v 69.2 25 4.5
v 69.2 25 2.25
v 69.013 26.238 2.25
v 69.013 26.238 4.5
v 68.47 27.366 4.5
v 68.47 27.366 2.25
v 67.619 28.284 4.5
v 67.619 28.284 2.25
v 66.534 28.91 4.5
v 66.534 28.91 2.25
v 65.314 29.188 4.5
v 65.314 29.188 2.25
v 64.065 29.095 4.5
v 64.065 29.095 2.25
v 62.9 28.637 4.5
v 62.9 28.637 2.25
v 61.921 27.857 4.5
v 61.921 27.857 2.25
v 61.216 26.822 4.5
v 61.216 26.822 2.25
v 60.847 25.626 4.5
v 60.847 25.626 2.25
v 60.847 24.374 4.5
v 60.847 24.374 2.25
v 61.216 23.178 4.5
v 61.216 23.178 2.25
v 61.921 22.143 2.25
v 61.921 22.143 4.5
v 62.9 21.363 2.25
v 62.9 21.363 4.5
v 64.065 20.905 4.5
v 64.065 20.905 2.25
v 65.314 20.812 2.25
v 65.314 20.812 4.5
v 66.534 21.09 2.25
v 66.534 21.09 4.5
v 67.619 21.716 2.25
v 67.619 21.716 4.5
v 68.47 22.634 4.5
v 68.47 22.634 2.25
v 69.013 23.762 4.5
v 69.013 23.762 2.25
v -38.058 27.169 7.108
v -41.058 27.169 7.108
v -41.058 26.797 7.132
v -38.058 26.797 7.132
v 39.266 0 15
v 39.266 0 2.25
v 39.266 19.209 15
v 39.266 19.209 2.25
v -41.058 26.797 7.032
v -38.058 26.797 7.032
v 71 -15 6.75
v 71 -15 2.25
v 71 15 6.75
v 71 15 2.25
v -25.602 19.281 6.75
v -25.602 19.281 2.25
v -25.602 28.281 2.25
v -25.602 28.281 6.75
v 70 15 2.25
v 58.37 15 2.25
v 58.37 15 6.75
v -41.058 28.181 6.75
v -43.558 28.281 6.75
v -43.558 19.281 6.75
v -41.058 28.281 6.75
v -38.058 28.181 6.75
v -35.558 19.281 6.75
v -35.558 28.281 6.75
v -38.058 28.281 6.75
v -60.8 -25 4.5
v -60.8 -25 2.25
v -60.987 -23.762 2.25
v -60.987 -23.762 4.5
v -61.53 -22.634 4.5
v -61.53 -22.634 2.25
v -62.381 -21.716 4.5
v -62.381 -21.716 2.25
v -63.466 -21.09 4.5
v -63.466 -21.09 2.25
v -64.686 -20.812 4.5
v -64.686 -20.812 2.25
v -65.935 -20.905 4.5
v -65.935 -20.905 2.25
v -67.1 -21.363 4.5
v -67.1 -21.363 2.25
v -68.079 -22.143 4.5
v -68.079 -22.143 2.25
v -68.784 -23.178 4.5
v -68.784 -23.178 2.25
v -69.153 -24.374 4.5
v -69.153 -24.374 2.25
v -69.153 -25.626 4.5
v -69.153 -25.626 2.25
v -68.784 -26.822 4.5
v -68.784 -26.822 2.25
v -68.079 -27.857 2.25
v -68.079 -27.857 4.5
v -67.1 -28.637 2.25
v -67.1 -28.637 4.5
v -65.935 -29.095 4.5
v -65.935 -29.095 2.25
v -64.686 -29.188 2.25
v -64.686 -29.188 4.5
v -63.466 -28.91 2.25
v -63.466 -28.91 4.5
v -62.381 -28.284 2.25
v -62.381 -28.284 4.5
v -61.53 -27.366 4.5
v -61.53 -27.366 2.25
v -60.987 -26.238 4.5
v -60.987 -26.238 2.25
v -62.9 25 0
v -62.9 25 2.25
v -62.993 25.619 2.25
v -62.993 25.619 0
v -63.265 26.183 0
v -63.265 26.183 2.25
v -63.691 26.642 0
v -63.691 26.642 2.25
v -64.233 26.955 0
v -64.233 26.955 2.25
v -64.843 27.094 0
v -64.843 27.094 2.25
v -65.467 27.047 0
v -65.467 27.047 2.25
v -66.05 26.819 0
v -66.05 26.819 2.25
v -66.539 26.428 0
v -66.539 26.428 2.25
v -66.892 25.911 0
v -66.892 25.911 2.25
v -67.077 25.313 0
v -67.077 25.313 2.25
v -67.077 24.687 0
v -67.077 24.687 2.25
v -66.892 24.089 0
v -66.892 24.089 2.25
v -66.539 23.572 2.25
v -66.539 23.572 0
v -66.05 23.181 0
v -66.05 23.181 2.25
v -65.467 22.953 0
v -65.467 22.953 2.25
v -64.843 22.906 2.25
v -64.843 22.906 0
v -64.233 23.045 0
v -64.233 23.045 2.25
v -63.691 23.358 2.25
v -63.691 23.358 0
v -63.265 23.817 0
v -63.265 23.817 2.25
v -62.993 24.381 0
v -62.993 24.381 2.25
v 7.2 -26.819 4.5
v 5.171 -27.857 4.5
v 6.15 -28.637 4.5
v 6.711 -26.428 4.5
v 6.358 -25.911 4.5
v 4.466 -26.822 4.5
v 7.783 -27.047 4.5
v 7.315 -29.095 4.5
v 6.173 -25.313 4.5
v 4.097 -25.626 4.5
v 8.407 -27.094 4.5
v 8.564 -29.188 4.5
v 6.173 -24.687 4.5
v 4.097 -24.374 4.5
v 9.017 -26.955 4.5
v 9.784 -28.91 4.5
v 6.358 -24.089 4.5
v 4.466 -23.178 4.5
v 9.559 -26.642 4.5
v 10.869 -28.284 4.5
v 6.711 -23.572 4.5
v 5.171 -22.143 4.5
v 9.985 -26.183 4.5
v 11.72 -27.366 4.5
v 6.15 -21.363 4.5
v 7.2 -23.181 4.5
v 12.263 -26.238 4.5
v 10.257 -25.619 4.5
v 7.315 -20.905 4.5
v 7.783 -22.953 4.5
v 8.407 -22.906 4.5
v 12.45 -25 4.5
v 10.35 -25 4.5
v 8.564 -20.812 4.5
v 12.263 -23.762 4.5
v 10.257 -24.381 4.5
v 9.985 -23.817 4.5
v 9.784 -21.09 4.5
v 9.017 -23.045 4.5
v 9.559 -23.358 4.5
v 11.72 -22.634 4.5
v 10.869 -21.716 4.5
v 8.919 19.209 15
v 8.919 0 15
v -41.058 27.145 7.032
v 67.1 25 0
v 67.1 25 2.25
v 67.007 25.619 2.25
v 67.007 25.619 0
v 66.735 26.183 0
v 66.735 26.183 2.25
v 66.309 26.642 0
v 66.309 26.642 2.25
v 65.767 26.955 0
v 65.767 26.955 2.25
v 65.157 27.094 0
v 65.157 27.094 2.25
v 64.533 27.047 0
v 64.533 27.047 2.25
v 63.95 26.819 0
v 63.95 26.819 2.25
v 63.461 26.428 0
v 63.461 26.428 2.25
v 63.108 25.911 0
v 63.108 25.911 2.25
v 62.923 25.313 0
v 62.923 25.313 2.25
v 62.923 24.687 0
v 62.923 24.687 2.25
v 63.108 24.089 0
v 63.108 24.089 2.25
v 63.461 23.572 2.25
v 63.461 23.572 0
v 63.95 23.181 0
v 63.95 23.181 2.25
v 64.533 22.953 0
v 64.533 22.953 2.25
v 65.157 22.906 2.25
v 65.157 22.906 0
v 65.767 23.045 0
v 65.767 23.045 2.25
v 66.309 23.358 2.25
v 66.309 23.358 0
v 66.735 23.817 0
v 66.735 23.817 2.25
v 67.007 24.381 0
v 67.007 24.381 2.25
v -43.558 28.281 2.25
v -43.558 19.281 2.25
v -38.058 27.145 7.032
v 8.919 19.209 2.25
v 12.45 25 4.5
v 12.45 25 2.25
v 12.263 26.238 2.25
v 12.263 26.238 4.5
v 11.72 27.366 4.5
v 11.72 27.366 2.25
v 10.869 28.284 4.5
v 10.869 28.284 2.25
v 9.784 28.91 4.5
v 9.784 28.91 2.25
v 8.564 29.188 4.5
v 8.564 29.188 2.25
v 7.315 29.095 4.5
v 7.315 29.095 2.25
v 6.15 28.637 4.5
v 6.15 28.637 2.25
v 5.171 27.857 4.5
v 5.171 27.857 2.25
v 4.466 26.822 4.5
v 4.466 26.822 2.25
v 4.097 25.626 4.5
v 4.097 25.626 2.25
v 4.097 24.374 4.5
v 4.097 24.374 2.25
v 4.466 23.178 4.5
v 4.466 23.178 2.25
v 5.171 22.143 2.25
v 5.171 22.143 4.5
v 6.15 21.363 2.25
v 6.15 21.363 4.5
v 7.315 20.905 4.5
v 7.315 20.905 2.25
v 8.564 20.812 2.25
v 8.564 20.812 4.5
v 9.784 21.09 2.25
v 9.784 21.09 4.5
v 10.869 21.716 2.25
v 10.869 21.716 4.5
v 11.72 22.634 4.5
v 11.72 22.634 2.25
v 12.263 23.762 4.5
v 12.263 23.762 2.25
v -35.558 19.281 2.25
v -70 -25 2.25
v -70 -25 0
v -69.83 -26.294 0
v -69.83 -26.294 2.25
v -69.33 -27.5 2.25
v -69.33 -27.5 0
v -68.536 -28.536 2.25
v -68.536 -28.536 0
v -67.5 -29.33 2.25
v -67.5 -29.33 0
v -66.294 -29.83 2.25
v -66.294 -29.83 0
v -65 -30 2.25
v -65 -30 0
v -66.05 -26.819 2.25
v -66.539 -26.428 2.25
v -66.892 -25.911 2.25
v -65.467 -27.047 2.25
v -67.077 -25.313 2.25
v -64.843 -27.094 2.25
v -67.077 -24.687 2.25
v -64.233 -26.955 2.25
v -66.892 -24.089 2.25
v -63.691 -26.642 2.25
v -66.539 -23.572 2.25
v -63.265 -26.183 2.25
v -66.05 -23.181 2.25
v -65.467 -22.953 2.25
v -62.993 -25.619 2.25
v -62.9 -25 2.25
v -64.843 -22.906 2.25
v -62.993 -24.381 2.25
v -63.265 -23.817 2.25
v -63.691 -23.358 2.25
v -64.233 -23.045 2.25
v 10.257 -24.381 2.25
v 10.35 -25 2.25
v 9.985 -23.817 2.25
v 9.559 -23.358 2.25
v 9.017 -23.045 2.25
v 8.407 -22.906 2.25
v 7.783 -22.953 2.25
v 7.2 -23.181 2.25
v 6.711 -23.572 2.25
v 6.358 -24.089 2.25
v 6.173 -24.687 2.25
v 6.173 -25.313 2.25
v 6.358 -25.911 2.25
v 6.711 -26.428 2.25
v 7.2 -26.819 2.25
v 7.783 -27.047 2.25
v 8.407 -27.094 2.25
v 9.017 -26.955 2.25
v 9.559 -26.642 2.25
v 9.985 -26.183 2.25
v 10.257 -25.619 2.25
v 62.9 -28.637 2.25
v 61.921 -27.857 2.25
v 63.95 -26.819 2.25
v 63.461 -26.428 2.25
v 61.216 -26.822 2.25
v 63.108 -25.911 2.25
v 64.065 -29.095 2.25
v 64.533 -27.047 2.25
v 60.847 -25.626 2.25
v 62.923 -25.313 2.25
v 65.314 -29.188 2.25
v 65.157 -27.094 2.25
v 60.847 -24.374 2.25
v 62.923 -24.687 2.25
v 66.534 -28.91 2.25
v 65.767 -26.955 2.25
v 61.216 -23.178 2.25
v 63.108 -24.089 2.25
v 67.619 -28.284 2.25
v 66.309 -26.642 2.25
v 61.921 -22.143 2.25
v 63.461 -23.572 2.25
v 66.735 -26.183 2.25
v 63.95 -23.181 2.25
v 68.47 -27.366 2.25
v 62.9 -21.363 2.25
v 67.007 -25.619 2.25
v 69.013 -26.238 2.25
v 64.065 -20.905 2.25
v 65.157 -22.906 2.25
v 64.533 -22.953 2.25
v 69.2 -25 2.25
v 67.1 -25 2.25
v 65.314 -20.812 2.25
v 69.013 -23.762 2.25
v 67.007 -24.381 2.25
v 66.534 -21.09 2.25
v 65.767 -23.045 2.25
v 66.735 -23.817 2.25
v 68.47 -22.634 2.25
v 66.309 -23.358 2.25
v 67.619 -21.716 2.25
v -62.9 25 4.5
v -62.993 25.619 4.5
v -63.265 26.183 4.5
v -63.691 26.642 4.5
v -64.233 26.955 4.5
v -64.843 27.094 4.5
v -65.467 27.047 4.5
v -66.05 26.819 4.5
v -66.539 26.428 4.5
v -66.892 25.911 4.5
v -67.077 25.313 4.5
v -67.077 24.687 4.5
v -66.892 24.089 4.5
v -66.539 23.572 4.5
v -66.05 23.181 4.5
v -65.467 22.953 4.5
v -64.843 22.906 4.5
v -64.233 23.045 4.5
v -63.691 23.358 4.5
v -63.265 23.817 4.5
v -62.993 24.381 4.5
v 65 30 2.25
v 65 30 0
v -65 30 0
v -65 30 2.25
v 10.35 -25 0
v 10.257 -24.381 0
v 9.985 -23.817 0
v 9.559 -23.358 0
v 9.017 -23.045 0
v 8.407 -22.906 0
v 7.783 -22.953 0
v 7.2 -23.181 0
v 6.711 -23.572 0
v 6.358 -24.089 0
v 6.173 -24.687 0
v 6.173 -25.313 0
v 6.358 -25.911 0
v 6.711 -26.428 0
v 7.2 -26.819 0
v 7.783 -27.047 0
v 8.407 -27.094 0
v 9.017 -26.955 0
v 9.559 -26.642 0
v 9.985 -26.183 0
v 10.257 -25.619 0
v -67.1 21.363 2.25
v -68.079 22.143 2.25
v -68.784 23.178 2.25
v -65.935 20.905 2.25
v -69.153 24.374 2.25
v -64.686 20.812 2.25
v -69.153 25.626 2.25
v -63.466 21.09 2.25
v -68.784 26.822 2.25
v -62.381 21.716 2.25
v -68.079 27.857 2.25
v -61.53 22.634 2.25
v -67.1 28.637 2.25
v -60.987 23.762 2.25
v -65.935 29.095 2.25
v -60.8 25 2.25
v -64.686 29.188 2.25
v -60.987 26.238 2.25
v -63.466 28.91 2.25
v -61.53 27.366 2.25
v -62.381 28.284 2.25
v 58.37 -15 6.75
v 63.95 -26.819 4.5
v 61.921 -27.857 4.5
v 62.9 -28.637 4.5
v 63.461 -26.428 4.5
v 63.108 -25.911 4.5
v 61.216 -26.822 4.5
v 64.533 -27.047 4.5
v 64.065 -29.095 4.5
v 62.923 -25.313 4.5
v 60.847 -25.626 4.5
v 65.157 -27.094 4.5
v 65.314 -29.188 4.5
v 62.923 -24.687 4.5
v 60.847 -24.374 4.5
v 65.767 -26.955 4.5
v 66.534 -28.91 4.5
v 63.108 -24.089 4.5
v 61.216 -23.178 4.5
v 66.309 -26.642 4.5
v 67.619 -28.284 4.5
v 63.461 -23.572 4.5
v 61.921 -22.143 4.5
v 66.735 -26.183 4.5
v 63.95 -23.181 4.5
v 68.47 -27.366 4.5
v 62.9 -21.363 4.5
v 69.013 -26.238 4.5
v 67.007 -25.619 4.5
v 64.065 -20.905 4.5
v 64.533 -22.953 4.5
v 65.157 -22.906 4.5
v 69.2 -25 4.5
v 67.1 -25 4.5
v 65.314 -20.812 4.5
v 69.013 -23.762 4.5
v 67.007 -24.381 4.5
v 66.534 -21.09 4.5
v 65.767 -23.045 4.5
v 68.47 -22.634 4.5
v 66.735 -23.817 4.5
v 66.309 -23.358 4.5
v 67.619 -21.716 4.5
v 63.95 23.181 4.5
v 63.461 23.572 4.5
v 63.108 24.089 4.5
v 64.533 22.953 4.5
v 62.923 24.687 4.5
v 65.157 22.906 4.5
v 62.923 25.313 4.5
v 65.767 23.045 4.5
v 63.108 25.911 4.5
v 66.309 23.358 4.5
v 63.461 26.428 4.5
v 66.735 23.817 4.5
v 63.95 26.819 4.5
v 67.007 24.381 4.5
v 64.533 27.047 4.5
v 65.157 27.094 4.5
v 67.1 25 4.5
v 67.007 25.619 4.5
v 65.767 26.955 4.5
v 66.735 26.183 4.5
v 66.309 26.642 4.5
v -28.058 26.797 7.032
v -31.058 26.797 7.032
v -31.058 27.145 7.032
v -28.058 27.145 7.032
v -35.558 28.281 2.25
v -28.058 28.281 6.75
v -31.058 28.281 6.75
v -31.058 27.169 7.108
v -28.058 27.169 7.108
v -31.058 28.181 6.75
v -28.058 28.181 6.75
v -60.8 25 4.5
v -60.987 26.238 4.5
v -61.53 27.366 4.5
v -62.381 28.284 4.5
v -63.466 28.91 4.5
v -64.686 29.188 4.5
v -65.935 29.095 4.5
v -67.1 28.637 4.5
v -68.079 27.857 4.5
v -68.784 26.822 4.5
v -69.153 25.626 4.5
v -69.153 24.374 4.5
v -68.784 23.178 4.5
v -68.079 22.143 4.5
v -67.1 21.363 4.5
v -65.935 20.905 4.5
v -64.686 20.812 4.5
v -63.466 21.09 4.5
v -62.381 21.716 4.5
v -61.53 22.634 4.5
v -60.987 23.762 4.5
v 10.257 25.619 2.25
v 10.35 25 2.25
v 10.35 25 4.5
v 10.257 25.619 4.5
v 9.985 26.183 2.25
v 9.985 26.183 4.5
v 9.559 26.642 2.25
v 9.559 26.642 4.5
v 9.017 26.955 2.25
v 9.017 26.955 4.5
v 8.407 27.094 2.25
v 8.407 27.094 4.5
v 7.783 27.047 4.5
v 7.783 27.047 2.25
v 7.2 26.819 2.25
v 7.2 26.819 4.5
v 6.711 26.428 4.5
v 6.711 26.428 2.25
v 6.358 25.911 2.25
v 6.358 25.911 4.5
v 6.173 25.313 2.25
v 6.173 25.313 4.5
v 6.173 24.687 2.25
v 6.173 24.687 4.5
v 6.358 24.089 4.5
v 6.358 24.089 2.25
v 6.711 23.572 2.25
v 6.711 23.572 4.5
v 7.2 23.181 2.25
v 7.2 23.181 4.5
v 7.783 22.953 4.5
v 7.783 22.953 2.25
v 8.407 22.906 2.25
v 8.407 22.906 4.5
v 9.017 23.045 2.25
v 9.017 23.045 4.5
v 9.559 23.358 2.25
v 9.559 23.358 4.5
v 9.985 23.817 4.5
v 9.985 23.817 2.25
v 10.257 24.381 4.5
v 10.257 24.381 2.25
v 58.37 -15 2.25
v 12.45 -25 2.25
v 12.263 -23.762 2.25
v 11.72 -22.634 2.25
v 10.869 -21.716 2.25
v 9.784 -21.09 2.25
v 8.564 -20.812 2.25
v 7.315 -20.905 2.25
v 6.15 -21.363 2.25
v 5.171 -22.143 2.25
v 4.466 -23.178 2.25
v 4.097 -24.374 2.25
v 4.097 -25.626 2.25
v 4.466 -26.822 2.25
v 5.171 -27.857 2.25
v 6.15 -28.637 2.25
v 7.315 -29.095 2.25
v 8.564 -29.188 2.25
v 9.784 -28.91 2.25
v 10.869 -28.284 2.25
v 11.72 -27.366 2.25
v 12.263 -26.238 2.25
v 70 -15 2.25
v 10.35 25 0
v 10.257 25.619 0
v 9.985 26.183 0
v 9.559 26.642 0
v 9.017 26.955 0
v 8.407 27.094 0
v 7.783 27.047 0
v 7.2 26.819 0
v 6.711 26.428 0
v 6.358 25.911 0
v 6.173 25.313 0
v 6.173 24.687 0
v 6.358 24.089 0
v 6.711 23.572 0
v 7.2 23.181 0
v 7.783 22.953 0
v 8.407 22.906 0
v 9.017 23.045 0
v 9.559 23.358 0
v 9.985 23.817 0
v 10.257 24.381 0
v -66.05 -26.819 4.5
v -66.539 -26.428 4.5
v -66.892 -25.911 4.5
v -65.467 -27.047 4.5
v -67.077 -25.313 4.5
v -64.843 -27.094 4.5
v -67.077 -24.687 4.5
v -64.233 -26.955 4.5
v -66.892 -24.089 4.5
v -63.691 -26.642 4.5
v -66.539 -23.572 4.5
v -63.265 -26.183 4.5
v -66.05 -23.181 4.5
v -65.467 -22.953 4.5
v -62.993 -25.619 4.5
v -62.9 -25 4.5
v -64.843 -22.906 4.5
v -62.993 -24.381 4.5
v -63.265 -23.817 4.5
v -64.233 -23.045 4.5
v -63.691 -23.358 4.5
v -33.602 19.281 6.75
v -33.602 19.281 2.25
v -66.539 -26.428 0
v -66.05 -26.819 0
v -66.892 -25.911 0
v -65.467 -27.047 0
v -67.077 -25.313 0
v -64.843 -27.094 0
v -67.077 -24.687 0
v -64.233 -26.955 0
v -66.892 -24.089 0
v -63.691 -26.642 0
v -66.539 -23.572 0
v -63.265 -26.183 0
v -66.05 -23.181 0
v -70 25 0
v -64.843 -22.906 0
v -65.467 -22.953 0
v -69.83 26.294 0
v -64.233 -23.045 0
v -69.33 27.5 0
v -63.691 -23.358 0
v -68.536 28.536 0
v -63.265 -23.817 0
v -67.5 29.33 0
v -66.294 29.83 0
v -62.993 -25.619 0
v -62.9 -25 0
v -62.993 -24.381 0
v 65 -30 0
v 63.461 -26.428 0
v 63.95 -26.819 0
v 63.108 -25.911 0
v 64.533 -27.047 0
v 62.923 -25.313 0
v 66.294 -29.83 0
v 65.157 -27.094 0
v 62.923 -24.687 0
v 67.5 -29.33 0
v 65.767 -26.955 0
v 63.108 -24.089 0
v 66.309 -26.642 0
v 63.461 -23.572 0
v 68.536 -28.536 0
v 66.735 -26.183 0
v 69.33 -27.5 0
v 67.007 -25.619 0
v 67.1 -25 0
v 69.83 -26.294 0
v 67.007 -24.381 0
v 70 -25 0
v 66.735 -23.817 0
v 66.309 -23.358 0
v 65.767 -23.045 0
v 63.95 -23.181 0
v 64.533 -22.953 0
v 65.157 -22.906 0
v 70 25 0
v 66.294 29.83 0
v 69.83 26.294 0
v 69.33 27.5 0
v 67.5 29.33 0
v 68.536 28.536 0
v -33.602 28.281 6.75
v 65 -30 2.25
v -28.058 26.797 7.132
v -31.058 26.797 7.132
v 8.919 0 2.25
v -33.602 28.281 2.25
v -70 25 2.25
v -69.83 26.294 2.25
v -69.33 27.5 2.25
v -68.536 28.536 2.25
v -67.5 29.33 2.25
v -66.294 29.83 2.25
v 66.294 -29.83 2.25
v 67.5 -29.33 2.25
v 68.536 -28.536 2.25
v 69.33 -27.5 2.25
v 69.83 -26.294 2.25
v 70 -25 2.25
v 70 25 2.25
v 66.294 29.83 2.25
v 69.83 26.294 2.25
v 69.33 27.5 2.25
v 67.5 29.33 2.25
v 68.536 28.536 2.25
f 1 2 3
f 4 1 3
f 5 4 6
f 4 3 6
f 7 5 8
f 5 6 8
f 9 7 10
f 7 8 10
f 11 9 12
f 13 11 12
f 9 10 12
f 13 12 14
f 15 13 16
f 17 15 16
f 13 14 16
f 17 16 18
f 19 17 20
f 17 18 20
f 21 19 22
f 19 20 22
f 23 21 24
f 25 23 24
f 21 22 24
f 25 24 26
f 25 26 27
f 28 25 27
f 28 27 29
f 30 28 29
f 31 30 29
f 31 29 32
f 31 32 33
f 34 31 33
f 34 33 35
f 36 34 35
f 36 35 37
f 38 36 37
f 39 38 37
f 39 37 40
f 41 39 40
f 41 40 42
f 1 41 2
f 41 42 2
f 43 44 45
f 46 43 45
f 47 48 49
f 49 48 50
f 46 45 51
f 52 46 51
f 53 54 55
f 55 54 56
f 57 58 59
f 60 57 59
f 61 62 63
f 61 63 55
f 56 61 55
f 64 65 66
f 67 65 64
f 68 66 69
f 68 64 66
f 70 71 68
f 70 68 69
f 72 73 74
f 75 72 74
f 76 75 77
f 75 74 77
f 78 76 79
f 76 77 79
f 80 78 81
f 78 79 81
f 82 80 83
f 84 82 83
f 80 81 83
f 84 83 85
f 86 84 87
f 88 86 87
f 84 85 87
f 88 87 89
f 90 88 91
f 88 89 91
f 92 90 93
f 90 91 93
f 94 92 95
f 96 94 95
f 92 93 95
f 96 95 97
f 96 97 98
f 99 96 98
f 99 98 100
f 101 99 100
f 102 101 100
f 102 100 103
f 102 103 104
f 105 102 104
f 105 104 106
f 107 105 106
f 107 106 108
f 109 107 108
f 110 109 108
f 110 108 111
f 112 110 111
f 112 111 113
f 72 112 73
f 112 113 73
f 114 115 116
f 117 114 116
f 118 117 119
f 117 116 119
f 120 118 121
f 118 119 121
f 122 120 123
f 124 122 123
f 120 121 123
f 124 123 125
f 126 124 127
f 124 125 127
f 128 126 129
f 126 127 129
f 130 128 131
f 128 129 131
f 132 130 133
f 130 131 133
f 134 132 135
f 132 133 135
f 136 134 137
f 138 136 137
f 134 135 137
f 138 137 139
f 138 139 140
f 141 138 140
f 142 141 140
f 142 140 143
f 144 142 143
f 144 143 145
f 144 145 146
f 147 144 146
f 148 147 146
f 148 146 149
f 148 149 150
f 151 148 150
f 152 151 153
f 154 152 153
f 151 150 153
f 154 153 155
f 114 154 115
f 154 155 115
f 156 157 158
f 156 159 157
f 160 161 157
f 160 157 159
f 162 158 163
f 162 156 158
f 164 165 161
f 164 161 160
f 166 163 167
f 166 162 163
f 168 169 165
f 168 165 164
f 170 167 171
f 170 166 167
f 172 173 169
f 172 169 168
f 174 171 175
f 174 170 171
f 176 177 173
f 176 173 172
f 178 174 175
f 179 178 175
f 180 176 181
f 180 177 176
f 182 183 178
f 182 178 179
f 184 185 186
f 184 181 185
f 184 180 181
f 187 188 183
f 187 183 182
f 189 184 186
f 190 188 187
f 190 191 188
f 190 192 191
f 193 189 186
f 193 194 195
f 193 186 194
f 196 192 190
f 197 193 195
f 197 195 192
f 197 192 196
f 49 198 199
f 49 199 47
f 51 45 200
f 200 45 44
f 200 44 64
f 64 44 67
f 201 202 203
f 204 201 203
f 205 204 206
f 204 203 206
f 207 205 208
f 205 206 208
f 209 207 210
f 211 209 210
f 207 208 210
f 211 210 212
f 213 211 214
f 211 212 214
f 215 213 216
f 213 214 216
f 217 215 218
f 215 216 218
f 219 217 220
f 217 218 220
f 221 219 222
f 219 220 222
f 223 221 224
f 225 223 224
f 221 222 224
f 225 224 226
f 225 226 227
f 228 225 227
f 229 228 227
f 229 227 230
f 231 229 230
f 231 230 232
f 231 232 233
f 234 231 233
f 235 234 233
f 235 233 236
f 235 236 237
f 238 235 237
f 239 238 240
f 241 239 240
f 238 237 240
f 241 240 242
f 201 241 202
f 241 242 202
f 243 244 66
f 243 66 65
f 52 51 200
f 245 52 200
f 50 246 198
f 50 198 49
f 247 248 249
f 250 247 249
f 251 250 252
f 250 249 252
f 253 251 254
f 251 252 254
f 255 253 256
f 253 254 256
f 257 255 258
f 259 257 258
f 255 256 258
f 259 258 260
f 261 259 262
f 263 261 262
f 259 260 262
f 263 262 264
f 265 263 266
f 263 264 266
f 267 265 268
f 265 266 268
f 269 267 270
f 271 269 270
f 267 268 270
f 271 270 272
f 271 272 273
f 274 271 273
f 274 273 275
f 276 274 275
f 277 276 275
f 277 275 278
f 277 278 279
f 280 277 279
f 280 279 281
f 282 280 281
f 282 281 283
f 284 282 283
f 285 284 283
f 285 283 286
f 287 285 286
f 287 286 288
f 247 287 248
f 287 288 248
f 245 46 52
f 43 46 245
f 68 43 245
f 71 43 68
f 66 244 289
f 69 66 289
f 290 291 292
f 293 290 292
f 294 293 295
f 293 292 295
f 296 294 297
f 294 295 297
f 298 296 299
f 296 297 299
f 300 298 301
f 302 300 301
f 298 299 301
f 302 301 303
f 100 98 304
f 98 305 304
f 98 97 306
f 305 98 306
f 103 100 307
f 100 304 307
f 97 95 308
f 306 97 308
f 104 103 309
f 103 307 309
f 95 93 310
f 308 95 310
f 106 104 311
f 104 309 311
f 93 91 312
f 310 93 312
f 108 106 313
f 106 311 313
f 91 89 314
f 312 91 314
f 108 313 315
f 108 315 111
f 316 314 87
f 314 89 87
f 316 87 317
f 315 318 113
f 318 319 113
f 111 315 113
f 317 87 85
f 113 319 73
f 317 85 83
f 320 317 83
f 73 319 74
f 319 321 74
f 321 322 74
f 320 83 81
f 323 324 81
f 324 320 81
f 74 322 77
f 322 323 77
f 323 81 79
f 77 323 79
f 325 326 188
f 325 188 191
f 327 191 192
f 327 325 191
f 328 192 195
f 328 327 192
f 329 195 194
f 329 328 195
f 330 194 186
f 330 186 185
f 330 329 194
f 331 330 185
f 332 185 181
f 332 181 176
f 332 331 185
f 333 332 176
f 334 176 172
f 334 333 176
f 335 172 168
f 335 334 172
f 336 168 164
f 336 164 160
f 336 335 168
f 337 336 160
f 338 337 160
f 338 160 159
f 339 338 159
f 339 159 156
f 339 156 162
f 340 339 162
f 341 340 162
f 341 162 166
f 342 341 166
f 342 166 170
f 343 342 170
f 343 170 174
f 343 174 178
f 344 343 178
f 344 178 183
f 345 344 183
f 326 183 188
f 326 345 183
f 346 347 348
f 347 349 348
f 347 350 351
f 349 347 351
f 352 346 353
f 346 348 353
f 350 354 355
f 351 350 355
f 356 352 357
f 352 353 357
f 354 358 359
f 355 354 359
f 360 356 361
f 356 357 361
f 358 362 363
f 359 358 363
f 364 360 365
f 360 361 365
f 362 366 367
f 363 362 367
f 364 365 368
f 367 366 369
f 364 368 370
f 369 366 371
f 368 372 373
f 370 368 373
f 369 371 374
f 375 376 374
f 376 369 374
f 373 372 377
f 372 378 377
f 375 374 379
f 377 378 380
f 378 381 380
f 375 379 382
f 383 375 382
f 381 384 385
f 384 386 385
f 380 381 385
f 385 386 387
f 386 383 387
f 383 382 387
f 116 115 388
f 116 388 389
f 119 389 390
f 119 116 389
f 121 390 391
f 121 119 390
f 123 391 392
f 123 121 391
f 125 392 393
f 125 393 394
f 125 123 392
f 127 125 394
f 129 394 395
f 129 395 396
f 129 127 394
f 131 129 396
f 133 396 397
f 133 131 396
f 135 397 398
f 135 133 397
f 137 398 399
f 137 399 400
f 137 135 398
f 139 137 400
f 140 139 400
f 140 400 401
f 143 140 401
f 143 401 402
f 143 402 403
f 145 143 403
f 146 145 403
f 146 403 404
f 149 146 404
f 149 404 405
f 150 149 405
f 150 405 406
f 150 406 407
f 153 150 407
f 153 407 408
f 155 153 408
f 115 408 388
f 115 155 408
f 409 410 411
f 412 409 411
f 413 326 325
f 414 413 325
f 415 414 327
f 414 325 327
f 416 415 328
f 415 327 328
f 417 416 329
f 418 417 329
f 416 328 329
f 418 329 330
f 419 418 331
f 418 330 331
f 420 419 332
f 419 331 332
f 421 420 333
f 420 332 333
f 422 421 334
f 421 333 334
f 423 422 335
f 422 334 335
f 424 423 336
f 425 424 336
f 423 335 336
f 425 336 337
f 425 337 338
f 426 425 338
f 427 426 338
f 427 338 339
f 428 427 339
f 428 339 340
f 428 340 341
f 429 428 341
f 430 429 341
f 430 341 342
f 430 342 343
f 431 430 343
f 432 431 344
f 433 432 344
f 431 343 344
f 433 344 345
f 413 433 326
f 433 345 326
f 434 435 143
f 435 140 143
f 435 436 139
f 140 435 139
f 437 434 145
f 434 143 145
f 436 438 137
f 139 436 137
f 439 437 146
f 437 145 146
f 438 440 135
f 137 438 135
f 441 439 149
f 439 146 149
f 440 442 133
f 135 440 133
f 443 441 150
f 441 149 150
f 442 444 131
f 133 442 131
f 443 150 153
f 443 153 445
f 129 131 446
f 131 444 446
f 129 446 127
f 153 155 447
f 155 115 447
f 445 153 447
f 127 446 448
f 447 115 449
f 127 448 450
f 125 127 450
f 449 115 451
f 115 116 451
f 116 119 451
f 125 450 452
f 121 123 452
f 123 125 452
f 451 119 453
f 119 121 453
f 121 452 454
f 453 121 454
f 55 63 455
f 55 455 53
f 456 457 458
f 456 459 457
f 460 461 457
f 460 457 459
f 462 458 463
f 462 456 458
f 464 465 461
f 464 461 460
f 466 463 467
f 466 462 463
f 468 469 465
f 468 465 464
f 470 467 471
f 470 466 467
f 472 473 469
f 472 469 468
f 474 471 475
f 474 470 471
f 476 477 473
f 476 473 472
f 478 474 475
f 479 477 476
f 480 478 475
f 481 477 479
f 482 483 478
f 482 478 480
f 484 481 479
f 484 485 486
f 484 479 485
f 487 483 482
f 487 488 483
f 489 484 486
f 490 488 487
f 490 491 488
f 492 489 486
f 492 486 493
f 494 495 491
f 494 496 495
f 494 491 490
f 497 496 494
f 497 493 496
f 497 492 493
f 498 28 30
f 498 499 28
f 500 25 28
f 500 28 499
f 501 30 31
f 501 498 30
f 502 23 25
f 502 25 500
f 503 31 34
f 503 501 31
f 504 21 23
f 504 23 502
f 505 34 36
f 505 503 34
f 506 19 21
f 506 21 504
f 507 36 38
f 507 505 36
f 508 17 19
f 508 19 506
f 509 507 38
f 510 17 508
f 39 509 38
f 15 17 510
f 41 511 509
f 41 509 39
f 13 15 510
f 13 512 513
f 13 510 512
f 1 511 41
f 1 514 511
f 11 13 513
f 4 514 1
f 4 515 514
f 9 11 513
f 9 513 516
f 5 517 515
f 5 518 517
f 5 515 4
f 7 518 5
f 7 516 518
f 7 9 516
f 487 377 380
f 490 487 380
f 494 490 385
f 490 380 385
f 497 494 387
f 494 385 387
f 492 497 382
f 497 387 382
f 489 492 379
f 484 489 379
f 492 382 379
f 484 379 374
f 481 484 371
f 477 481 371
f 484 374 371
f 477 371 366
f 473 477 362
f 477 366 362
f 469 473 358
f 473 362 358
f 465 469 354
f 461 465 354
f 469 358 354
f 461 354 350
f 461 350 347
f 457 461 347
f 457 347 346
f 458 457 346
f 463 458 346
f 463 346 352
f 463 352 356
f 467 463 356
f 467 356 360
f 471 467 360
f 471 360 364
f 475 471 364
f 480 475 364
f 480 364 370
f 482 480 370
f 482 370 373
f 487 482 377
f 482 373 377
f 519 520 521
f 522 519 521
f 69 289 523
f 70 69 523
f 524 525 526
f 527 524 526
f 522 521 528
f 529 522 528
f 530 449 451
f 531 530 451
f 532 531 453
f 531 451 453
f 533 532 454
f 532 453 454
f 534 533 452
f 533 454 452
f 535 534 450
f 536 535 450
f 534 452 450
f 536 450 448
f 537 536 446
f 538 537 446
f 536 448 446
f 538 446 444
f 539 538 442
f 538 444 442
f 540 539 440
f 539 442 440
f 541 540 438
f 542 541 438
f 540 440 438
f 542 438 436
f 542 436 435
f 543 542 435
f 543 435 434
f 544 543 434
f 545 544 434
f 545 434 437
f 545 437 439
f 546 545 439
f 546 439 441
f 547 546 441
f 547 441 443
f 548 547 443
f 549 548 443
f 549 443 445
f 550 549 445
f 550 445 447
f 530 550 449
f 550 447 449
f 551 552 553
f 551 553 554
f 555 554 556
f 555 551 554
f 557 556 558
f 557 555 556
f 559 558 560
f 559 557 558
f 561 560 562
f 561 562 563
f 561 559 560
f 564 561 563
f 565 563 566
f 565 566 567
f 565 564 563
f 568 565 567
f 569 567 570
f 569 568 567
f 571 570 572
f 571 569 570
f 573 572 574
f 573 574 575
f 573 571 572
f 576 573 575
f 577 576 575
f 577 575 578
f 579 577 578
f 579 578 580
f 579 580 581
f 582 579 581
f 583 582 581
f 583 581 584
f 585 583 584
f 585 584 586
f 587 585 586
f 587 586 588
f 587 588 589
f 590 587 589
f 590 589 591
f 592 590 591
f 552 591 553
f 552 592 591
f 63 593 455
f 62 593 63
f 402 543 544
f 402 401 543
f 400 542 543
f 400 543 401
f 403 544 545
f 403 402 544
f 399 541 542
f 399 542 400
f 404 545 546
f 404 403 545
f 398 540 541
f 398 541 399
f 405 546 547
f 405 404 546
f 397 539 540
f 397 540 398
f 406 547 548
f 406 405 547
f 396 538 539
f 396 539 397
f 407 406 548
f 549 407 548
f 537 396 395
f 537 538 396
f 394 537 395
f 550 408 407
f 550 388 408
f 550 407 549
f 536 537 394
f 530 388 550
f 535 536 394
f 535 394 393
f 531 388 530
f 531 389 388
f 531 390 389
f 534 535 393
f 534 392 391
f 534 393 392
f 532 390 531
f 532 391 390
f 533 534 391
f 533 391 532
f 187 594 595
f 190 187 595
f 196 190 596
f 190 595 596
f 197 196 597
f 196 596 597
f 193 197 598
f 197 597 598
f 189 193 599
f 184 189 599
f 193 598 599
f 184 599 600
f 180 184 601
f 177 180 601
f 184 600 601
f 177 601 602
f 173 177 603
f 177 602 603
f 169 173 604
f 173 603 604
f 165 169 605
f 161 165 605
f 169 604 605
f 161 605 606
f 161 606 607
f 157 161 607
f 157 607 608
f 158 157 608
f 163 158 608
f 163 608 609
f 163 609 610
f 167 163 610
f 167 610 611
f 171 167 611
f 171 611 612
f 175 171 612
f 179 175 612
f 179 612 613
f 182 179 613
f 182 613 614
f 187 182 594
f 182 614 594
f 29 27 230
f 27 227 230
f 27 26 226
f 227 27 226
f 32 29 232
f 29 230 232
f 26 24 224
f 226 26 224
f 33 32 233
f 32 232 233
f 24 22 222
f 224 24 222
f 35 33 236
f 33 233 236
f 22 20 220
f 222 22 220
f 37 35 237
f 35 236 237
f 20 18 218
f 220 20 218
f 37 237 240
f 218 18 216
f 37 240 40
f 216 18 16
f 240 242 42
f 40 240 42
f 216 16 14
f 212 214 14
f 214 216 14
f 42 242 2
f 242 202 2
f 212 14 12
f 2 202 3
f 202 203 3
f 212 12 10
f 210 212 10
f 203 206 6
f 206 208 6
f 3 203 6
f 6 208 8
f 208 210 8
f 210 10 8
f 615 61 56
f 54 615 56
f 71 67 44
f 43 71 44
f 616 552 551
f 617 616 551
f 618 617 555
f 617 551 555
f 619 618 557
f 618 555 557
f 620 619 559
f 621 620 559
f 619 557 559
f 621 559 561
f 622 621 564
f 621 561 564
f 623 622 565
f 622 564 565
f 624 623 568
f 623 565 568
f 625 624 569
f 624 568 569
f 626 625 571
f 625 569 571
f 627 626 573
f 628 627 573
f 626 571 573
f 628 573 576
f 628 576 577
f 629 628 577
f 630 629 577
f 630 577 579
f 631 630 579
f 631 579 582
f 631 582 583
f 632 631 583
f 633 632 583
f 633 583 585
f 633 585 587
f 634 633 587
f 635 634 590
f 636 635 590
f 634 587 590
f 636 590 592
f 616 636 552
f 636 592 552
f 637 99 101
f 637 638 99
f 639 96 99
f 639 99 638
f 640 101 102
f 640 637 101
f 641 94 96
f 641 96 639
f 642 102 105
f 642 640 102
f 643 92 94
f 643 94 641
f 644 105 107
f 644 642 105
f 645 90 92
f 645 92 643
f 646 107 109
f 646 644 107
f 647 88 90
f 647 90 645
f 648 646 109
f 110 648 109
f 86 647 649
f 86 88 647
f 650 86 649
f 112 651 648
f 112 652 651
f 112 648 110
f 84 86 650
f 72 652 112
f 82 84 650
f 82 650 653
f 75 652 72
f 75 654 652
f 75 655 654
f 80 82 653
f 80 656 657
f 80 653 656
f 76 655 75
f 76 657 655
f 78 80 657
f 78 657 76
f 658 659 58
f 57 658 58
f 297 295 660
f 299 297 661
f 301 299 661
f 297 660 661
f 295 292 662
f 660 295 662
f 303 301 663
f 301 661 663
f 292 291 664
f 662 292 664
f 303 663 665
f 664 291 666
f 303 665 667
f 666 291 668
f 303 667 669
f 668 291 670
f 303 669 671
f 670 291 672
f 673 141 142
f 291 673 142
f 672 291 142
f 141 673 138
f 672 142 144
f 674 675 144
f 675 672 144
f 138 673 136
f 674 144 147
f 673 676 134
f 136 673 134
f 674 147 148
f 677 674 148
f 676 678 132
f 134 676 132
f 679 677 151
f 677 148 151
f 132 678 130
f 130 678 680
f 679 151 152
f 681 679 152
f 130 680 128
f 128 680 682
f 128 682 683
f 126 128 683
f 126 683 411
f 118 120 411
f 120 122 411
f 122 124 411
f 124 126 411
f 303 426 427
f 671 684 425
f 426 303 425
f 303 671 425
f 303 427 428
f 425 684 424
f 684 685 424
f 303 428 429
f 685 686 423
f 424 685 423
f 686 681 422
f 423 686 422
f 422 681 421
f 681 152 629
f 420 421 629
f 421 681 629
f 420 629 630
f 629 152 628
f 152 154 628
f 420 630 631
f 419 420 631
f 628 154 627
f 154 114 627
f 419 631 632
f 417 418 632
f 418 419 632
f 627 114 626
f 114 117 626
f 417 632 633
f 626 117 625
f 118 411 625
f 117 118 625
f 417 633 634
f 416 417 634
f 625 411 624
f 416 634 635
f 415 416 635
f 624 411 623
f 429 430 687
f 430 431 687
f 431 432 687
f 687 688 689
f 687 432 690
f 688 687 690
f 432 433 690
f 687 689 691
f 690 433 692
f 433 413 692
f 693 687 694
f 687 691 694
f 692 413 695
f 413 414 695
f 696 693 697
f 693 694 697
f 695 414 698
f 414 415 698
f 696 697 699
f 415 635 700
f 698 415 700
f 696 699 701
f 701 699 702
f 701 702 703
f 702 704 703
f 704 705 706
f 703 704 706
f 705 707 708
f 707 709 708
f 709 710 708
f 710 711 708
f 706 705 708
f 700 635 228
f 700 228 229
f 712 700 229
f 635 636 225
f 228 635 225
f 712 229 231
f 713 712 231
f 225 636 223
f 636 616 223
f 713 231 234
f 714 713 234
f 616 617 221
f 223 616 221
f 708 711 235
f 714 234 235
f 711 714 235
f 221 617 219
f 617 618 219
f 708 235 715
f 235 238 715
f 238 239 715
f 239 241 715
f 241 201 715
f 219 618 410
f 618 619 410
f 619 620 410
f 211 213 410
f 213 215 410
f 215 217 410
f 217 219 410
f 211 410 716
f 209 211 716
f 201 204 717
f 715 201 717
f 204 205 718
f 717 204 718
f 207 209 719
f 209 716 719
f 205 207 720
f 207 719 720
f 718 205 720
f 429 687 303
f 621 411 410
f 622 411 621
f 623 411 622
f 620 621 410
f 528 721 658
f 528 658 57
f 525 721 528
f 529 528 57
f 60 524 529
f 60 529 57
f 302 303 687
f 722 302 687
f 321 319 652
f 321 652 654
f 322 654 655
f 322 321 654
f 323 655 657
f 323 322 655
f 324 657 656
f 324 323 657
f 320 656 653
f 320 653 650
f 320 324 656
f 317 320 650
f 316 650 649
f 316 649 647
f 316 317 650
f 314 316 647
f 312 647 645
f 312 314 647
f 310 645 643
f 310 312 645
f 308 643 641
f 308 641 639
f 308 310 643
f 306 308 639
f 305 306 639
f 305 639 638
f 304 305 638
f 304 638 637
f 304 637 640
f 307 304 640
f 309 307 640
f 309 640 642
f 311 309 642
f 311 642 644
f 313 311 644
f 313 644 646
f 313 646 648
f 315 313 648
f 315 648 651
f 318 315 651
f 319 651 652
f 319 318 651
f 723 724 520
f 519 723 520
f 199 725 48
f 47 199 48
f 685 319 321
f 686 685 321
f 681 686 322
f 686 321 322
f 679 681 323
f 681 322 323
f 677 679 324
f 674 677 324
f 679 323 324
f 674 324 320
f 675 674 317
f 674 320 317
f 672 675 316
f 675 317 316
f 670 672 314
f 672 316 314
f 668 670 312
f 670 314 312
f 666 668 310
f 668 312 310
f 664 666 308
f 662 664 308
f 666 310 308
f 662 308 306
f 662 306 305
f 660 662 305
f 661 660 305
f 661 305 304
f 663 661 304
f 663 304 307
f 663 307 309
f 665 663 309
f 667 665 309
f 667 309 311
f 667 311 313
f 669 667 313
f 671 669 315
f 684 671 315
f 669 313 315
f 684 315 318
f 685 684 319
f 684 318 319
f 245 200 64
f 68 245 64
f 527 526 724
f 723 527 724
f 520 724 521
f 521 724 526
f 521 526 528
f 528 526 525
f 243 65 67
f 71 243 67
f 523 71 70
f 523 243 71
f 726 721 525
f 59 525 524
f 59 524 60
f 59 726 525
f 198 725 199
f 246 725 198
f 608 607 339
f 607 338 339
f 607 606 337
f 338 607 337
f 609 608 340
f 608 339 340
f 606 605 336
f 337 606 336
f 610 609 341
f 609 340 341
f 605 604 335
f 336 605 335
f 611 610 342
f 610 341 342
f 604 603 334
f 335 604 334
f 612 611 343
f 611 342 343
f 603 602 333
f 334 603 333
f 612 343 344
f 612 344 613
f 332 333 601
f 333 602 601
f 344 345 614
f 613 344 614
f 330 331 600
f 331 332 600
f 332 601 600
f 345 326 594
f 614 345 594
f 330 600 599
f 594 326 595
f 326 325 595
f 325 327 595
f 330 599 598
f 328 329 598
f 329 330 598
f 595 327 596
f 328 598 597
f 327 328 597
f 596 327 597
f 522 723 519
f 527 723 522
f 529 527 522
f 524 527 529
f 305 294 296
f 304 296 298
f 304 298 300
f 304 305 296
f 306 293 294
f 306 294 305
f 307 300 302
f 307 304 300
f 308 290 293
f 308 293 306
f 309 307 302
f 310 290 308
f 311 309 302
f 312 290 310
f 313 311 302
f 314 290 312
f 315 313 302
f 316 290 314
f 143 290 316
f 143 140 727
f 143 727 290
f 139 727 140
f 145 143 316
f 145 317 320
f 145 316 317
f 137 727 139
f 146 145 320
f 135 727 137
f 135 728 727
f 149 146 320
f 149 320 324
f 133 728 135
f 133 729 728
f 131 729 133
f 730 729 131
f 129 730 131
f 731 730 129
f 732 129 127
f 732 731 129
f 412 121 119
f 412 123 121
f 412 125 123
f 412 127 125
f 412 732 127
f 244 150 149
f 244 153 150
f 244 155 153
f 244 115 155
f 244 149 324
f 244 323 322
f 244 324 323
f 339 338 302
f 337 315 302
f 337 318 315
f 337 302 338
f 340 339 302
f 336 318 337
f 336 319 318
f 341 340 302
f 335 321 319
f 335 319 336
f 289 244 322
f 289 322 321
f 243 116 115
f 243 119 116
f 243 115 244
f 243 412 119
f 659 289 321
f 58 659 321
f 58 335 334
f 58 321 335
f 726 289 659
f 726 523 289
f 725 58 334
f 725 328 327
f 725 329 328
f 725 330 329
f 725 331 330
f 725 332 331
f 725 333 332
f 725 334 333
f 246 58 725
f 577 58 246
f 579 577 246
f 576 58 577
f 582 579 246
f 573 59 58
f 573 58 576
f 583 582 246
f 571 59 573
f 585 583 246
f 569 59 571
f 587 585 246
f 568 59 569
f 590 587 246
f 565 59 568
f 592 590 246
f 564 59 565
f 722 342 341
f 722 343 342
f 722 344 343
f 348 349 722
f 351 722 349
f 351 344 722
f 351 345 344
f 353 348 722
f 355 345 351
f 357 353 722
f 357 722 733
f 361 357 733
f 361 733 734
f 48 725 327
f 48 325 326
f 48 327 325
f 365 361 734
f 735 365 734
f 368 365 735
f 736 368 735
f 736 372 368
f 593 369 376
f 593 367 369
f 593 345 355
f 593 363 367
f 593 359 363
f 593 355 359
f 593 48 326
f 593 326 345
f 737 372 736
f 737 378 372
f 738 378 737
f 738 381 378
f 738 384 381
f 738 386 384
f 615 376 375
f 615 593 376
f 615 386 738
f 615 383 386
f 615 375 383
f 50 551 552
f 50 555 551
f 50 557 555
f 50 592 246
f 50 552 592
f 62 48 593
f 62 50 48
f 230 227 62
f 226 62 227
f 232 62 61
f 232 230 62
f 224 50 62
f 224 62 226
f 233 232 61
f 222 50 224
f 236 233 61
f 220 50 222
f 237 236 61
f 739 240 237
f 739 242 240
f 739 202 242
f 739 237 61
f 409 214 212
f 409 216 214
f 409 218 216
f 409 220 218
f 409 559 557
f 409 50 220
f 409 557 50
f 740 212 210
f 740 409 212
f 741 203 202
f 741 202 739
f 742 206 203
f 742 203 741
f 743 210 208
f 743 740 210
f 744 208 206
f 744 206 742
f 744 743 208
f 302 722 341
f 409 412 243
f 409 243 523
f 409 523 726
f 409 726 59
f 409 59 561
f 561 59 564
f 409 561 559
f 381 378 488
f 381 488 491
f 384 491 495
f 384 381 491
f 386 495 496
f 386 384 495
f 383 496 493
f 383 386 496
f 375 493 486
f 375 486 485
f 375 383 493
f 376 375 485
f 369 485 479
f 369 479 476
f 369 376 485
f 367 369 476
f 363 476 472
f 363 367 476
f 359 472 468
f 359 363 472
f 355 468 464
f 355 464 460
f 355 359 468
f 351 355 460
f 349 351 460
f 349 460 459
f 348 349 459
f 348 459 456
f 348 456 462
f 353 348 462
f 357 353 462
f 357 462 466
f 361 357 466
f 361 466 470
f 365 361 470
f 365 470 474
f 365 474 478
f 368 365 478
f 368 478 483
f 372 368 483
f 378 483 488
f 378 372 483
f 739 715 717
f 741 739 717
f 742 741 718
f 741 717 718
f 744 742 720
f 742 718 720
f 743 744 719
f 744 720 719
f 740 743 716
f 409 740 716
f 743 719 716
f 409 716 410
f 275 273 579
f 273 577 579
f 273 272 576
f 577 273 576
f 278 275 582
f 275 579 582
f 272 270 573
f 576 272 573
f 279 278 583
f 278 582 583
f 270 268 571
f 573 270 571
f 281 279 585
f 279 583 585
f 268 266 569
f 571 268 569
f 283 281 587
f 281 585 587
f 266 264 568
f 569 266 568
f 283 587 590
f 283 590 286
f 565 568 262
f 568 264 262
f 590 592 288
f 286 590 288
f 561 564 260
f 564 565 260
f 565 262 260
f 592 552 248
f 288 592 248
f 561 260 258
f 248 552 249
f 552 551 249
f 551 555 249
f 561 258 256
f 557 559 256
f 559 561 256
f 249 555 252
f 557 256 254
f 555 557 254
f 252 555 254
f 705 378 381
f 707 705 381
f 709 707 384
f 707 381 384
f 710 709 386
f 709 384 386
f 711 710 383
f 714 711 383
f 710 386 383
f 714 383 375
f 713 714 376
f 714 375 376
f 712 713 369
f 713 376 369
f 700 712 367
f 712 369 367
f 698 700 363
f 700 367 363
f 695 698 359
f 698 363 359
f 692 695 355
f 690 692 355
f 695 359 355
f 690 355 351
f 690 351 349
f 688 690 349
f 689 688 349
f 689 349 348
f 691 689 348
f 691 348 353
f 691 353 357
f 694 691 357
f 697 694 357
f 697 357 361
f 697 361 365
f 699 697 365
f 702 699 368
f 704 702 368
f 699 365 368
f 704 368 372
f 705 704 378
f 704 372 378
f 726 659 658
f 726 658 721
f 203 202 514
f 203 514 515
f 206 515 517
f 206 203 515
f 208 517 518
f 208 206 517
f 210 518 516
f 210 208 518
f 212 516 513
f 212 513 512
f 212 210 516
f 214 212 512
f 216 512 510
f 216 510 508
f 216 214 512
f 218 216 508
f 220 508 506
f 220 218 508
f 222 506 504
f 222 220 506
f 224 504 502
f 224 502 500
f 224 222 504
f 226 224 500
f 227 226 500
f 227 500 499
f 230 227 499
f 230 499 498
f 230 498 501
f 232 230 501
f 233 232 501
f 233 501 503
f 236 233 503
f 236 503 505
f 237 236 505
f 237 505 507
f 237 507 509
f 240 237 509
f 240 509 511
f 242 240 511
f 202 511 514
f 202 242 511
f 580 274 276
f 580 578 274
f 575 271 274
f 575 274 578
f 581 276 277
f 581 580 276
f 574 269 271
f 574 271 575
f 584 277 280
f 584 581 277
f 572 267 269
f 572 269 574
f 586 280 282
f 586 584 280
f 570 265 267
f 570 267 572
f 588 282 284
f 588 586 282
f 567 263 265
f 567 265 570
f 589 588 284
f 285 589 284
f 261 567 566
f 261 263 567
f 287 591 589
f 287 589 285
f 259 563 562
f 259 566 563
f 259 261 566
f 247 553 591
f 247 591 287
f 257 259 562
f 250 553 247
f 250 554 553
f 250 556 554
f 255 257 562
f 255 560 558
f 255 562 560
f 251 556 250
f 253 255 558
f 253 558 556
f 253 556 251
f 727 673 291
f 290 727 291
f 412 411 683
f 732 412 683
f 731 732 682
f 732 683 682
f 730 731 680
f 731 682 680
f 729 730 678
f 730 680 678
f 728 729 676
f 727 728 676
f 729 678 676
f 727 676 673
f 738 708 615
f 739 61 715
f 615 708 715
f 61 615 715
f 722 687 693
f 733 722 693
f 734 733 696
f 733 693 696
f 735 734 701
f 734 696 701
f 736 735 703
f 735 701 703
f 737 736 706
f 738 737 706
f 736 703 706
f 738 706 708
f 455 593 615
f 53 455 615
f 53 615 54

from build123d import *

# Parameters (mm, degrees)
BOSS_EXTRUDE1_DEPTH   = 2.25
SKETCH2_R             = 4.2
SKETCH2_R_2           = 2.1
BOSS_EXTRUDE2_DEPTH   = 2.25
BOSS_EXTRUDE2_2_DEPTH = 2.25
BOSS_EXTRUDE2_3_DEPTH = 2.25
BOSS_EXTRUDE2_4_DEPTH = 2.25
BOSS_EXTRUDE2_5_DEPTH = 2.25
BOSS_EXTRUDE2_6_DEPTH = 2.25
SKETCH4_R             = 2.1
CUT_EXTRUDE2_DEPTH    = 2.25
SKETCH5_W             = 8
SKETCH5_H             = 9
BOSS_EXTRUDE3_DEPTH   = 4.5
LOFT1_START           = -41.058294719
LOFT1_DEPTH           = 3
LPATTERN1_COUNT       = 2
LPATTERN1_PITCH       = 10
SKETCH7_W             = 30.346967849
SKETCH7_H             = 19.209264207
BOSS_EXTRUDE4_DEPTH   = 12.75
SKETCH8_W             = 12.629936129
SKETCH8_H             = 30
BOSS_EXTRUDE5_DEPTH   = 4.5


# Read off the part's stored shape, not the designer's step: Loft1
with BuildPart() as part:
    # Sketch1 → Boss-Extrude1 (new body)
    with BuildSketch(Plane.XY):
        with BuildLine():
            Line((-65, -30), (65, -30))
            ThreePointArc((65, -30), (68.535533906, -28.535533906), (70, -25))
            Line((70, -25), (70, 25))
            ThreePointArc((70, 25), (68.535533906, 28.535533906), (65, 30))
            Line((65, 30), (-65, 30))
            ThreePointArc((-65, 30), (-68.535533906, 28.535533906), (-70, 25))
            Line((-70, 25), (-70, -25))
            ThreePointArc((-70, -25), (-68.535533906, -28.535533906), (-65, -30))
        make_face()
    extrude(amount=BOSS_EXTRUDE1_DEPTH)

    # Sketch4 → Cut-Extrude2 (cut)
    with BuildSketch(Plane.XY.offset(2.25)):
        with Locations((-65, 25)):
            Circle(SKETCH4_R)
        with Locations((65, 25)):
            Circle(SKETCH4_R)
        with Locations((65, -25)):
            Circle(SKETCH4_R)
        with Locations((-65, -25)):
            Circle(SKETCH4_R)
        with Locations((8.25, 25)):
            Circle(SKETCH4_R)
        with Locations((8.25, -25)):
            Circle(SKETCH4_R)
    extrude(amount=-CUT_EXTRUDE2_DEPTH, mode=Mode.SUBTRACT)

    # Sketch5 → Boss-Extrude3 (add)
    with BuildSketch(Plane.XY.offset(2.25)):
        with Locations((-39.558294718, 23.781458124)):
            Rectangle(SKETCH5_W, SKETCH5_H)
        with Locations((-29.601987553, 23.781458124)):
            Rectangle(SKETCH5_W, SKETCH5_H)
    extrude(amount=BOSS_EXTRUDE3_DEPTH)

    # Loft1 outline → Loft1 (add)
    with BuildSketch(Plane.YZ.offset(LOFT1_START)):
        Polygon((27.16929948, 7.10787959), (26.797003838, 7.132337071), (26.797003838, 7.032337071), (27.144841998, 7.032337071), (28.181458123, 6.75), (28.281458123, 6.75), align=None)
    loft1 = extrude(amount=LOFT1_DEPTH)

    # LPattern1: Loft1 ×2
    with Locations(*[(i * LPATTERN1_PITCH, 0, 0) for i in range(1, LPATTERN1_COUNT)]):
        add(loft1)

    # Sketch7 → Boss-Extrude4 (add)
    with BuildSketch(Plane.XY.offset(2.25)):
        with Locations((24.092085971, 9.604632104)):
            Rectangle(SKETCH7_W, SKETCH7_H)
    extrude(amount=BOSS_EXTRUDE4_DEPTH)

    # Sketch8 → Boss-Extrude5 (add)
    with BuildSketch(Plane.XY.offset(2.25)):
        with Locations((64.685031936, 0)):
            Rectangle(SKETCH8_W, SKETCH8_H)
    extrude(amount=BOSS_EXTRUDE5_DEPTH)


with BuildPart() as body_2:
    # Sketch2 → Boss-Extrude2 (new body)
    with BuildSketch(Plane.XY.offset(2.25)):
        with Locations((-65, 25)):
            Circle(SKETCH2_R)
        with Locations((-65, 25)):
            Circle(SKETCH2_R_2, mode=Mode.SUBTRACT)
    extrude(amount=BOSS_EXTRUDE2_DEPTH)


with BuildPart() as body_3:
    # Sketch2 → Boss-Extrude2 2 (new body)
    with BuildSketch(Plane.XY.offset(2.25)):
        with Locations((65, 25)):
            Circle(SKETCH2_R)
        with Locations((65, 25)):
            Circle(SKETCH2_R_2, mode=Mode.SUBTRACT)
    extrude(amount=BOSS_EXTRUDE2_2_DEPTH)


with BuildPart() as body_4:
    # Sketch2 → Boss-Extrude2 3 (new body)
    with BuildSketch(Plane.XY.offset(2.25)):
        with Locations((65, -25)):
            Circle(SKETCH2_R)
        with Locations((65, -25)):
            Circle(SKETCH2_R_2, mode=Mode.SUBTRACT)
    extrude(amount=BOSS_EXTRUDE2_3_DEPTH)


with BuildPart() as body_5:
    # Sketch2 → Boss-Extrude2 4 (new body)
    with BuildSketch(Plane.XY.offset(2.25)):
        with Locations((-65, -25)):
            Circle(SKETCH2_R)
        with Locations((-65, -25)):
            Circle(SKETCH2_R_2, mode=Mode.SUBTRACT)
    extrude(amount=BOSS_EXTRUDE2_4_DEPTH)


with BuildPart() as body_6:
    # Sketch2 → Boss-Extrude2 5 (new body)
    with BuildSketch(Plane.XY.offset(2.25)):
        with Locations((8.25, 25)):
            Circle(SKETCH2_R)
        with Locations((8.25, 25)):
            Circle(SKETCH2_R_2, mode=Mode.SUBTRACT)
    extrude(amount=BOSS_EXTRUDE2_5_DEPTH)


with BuildPart() as body_7:
    # Sketch2 → Boss-Extrude2 6 (new body)
    with BuildSketch(Plane.XY.offset(2.25)):
        with Locations((8.25, -25)):
            Circle(SKETCH2_R)
        with Locations((8.25, -25)):
            Circle(SKETCH2_R_2, mode=Mode.SUBTRACT)
    extrude(amount=BOSS_EXTRUDE2_6_DEPTH)


solid = Compound([part.part, body_2.part, body_3.part, body_4.part, body_5.part, body_6.part, body_7.part])
